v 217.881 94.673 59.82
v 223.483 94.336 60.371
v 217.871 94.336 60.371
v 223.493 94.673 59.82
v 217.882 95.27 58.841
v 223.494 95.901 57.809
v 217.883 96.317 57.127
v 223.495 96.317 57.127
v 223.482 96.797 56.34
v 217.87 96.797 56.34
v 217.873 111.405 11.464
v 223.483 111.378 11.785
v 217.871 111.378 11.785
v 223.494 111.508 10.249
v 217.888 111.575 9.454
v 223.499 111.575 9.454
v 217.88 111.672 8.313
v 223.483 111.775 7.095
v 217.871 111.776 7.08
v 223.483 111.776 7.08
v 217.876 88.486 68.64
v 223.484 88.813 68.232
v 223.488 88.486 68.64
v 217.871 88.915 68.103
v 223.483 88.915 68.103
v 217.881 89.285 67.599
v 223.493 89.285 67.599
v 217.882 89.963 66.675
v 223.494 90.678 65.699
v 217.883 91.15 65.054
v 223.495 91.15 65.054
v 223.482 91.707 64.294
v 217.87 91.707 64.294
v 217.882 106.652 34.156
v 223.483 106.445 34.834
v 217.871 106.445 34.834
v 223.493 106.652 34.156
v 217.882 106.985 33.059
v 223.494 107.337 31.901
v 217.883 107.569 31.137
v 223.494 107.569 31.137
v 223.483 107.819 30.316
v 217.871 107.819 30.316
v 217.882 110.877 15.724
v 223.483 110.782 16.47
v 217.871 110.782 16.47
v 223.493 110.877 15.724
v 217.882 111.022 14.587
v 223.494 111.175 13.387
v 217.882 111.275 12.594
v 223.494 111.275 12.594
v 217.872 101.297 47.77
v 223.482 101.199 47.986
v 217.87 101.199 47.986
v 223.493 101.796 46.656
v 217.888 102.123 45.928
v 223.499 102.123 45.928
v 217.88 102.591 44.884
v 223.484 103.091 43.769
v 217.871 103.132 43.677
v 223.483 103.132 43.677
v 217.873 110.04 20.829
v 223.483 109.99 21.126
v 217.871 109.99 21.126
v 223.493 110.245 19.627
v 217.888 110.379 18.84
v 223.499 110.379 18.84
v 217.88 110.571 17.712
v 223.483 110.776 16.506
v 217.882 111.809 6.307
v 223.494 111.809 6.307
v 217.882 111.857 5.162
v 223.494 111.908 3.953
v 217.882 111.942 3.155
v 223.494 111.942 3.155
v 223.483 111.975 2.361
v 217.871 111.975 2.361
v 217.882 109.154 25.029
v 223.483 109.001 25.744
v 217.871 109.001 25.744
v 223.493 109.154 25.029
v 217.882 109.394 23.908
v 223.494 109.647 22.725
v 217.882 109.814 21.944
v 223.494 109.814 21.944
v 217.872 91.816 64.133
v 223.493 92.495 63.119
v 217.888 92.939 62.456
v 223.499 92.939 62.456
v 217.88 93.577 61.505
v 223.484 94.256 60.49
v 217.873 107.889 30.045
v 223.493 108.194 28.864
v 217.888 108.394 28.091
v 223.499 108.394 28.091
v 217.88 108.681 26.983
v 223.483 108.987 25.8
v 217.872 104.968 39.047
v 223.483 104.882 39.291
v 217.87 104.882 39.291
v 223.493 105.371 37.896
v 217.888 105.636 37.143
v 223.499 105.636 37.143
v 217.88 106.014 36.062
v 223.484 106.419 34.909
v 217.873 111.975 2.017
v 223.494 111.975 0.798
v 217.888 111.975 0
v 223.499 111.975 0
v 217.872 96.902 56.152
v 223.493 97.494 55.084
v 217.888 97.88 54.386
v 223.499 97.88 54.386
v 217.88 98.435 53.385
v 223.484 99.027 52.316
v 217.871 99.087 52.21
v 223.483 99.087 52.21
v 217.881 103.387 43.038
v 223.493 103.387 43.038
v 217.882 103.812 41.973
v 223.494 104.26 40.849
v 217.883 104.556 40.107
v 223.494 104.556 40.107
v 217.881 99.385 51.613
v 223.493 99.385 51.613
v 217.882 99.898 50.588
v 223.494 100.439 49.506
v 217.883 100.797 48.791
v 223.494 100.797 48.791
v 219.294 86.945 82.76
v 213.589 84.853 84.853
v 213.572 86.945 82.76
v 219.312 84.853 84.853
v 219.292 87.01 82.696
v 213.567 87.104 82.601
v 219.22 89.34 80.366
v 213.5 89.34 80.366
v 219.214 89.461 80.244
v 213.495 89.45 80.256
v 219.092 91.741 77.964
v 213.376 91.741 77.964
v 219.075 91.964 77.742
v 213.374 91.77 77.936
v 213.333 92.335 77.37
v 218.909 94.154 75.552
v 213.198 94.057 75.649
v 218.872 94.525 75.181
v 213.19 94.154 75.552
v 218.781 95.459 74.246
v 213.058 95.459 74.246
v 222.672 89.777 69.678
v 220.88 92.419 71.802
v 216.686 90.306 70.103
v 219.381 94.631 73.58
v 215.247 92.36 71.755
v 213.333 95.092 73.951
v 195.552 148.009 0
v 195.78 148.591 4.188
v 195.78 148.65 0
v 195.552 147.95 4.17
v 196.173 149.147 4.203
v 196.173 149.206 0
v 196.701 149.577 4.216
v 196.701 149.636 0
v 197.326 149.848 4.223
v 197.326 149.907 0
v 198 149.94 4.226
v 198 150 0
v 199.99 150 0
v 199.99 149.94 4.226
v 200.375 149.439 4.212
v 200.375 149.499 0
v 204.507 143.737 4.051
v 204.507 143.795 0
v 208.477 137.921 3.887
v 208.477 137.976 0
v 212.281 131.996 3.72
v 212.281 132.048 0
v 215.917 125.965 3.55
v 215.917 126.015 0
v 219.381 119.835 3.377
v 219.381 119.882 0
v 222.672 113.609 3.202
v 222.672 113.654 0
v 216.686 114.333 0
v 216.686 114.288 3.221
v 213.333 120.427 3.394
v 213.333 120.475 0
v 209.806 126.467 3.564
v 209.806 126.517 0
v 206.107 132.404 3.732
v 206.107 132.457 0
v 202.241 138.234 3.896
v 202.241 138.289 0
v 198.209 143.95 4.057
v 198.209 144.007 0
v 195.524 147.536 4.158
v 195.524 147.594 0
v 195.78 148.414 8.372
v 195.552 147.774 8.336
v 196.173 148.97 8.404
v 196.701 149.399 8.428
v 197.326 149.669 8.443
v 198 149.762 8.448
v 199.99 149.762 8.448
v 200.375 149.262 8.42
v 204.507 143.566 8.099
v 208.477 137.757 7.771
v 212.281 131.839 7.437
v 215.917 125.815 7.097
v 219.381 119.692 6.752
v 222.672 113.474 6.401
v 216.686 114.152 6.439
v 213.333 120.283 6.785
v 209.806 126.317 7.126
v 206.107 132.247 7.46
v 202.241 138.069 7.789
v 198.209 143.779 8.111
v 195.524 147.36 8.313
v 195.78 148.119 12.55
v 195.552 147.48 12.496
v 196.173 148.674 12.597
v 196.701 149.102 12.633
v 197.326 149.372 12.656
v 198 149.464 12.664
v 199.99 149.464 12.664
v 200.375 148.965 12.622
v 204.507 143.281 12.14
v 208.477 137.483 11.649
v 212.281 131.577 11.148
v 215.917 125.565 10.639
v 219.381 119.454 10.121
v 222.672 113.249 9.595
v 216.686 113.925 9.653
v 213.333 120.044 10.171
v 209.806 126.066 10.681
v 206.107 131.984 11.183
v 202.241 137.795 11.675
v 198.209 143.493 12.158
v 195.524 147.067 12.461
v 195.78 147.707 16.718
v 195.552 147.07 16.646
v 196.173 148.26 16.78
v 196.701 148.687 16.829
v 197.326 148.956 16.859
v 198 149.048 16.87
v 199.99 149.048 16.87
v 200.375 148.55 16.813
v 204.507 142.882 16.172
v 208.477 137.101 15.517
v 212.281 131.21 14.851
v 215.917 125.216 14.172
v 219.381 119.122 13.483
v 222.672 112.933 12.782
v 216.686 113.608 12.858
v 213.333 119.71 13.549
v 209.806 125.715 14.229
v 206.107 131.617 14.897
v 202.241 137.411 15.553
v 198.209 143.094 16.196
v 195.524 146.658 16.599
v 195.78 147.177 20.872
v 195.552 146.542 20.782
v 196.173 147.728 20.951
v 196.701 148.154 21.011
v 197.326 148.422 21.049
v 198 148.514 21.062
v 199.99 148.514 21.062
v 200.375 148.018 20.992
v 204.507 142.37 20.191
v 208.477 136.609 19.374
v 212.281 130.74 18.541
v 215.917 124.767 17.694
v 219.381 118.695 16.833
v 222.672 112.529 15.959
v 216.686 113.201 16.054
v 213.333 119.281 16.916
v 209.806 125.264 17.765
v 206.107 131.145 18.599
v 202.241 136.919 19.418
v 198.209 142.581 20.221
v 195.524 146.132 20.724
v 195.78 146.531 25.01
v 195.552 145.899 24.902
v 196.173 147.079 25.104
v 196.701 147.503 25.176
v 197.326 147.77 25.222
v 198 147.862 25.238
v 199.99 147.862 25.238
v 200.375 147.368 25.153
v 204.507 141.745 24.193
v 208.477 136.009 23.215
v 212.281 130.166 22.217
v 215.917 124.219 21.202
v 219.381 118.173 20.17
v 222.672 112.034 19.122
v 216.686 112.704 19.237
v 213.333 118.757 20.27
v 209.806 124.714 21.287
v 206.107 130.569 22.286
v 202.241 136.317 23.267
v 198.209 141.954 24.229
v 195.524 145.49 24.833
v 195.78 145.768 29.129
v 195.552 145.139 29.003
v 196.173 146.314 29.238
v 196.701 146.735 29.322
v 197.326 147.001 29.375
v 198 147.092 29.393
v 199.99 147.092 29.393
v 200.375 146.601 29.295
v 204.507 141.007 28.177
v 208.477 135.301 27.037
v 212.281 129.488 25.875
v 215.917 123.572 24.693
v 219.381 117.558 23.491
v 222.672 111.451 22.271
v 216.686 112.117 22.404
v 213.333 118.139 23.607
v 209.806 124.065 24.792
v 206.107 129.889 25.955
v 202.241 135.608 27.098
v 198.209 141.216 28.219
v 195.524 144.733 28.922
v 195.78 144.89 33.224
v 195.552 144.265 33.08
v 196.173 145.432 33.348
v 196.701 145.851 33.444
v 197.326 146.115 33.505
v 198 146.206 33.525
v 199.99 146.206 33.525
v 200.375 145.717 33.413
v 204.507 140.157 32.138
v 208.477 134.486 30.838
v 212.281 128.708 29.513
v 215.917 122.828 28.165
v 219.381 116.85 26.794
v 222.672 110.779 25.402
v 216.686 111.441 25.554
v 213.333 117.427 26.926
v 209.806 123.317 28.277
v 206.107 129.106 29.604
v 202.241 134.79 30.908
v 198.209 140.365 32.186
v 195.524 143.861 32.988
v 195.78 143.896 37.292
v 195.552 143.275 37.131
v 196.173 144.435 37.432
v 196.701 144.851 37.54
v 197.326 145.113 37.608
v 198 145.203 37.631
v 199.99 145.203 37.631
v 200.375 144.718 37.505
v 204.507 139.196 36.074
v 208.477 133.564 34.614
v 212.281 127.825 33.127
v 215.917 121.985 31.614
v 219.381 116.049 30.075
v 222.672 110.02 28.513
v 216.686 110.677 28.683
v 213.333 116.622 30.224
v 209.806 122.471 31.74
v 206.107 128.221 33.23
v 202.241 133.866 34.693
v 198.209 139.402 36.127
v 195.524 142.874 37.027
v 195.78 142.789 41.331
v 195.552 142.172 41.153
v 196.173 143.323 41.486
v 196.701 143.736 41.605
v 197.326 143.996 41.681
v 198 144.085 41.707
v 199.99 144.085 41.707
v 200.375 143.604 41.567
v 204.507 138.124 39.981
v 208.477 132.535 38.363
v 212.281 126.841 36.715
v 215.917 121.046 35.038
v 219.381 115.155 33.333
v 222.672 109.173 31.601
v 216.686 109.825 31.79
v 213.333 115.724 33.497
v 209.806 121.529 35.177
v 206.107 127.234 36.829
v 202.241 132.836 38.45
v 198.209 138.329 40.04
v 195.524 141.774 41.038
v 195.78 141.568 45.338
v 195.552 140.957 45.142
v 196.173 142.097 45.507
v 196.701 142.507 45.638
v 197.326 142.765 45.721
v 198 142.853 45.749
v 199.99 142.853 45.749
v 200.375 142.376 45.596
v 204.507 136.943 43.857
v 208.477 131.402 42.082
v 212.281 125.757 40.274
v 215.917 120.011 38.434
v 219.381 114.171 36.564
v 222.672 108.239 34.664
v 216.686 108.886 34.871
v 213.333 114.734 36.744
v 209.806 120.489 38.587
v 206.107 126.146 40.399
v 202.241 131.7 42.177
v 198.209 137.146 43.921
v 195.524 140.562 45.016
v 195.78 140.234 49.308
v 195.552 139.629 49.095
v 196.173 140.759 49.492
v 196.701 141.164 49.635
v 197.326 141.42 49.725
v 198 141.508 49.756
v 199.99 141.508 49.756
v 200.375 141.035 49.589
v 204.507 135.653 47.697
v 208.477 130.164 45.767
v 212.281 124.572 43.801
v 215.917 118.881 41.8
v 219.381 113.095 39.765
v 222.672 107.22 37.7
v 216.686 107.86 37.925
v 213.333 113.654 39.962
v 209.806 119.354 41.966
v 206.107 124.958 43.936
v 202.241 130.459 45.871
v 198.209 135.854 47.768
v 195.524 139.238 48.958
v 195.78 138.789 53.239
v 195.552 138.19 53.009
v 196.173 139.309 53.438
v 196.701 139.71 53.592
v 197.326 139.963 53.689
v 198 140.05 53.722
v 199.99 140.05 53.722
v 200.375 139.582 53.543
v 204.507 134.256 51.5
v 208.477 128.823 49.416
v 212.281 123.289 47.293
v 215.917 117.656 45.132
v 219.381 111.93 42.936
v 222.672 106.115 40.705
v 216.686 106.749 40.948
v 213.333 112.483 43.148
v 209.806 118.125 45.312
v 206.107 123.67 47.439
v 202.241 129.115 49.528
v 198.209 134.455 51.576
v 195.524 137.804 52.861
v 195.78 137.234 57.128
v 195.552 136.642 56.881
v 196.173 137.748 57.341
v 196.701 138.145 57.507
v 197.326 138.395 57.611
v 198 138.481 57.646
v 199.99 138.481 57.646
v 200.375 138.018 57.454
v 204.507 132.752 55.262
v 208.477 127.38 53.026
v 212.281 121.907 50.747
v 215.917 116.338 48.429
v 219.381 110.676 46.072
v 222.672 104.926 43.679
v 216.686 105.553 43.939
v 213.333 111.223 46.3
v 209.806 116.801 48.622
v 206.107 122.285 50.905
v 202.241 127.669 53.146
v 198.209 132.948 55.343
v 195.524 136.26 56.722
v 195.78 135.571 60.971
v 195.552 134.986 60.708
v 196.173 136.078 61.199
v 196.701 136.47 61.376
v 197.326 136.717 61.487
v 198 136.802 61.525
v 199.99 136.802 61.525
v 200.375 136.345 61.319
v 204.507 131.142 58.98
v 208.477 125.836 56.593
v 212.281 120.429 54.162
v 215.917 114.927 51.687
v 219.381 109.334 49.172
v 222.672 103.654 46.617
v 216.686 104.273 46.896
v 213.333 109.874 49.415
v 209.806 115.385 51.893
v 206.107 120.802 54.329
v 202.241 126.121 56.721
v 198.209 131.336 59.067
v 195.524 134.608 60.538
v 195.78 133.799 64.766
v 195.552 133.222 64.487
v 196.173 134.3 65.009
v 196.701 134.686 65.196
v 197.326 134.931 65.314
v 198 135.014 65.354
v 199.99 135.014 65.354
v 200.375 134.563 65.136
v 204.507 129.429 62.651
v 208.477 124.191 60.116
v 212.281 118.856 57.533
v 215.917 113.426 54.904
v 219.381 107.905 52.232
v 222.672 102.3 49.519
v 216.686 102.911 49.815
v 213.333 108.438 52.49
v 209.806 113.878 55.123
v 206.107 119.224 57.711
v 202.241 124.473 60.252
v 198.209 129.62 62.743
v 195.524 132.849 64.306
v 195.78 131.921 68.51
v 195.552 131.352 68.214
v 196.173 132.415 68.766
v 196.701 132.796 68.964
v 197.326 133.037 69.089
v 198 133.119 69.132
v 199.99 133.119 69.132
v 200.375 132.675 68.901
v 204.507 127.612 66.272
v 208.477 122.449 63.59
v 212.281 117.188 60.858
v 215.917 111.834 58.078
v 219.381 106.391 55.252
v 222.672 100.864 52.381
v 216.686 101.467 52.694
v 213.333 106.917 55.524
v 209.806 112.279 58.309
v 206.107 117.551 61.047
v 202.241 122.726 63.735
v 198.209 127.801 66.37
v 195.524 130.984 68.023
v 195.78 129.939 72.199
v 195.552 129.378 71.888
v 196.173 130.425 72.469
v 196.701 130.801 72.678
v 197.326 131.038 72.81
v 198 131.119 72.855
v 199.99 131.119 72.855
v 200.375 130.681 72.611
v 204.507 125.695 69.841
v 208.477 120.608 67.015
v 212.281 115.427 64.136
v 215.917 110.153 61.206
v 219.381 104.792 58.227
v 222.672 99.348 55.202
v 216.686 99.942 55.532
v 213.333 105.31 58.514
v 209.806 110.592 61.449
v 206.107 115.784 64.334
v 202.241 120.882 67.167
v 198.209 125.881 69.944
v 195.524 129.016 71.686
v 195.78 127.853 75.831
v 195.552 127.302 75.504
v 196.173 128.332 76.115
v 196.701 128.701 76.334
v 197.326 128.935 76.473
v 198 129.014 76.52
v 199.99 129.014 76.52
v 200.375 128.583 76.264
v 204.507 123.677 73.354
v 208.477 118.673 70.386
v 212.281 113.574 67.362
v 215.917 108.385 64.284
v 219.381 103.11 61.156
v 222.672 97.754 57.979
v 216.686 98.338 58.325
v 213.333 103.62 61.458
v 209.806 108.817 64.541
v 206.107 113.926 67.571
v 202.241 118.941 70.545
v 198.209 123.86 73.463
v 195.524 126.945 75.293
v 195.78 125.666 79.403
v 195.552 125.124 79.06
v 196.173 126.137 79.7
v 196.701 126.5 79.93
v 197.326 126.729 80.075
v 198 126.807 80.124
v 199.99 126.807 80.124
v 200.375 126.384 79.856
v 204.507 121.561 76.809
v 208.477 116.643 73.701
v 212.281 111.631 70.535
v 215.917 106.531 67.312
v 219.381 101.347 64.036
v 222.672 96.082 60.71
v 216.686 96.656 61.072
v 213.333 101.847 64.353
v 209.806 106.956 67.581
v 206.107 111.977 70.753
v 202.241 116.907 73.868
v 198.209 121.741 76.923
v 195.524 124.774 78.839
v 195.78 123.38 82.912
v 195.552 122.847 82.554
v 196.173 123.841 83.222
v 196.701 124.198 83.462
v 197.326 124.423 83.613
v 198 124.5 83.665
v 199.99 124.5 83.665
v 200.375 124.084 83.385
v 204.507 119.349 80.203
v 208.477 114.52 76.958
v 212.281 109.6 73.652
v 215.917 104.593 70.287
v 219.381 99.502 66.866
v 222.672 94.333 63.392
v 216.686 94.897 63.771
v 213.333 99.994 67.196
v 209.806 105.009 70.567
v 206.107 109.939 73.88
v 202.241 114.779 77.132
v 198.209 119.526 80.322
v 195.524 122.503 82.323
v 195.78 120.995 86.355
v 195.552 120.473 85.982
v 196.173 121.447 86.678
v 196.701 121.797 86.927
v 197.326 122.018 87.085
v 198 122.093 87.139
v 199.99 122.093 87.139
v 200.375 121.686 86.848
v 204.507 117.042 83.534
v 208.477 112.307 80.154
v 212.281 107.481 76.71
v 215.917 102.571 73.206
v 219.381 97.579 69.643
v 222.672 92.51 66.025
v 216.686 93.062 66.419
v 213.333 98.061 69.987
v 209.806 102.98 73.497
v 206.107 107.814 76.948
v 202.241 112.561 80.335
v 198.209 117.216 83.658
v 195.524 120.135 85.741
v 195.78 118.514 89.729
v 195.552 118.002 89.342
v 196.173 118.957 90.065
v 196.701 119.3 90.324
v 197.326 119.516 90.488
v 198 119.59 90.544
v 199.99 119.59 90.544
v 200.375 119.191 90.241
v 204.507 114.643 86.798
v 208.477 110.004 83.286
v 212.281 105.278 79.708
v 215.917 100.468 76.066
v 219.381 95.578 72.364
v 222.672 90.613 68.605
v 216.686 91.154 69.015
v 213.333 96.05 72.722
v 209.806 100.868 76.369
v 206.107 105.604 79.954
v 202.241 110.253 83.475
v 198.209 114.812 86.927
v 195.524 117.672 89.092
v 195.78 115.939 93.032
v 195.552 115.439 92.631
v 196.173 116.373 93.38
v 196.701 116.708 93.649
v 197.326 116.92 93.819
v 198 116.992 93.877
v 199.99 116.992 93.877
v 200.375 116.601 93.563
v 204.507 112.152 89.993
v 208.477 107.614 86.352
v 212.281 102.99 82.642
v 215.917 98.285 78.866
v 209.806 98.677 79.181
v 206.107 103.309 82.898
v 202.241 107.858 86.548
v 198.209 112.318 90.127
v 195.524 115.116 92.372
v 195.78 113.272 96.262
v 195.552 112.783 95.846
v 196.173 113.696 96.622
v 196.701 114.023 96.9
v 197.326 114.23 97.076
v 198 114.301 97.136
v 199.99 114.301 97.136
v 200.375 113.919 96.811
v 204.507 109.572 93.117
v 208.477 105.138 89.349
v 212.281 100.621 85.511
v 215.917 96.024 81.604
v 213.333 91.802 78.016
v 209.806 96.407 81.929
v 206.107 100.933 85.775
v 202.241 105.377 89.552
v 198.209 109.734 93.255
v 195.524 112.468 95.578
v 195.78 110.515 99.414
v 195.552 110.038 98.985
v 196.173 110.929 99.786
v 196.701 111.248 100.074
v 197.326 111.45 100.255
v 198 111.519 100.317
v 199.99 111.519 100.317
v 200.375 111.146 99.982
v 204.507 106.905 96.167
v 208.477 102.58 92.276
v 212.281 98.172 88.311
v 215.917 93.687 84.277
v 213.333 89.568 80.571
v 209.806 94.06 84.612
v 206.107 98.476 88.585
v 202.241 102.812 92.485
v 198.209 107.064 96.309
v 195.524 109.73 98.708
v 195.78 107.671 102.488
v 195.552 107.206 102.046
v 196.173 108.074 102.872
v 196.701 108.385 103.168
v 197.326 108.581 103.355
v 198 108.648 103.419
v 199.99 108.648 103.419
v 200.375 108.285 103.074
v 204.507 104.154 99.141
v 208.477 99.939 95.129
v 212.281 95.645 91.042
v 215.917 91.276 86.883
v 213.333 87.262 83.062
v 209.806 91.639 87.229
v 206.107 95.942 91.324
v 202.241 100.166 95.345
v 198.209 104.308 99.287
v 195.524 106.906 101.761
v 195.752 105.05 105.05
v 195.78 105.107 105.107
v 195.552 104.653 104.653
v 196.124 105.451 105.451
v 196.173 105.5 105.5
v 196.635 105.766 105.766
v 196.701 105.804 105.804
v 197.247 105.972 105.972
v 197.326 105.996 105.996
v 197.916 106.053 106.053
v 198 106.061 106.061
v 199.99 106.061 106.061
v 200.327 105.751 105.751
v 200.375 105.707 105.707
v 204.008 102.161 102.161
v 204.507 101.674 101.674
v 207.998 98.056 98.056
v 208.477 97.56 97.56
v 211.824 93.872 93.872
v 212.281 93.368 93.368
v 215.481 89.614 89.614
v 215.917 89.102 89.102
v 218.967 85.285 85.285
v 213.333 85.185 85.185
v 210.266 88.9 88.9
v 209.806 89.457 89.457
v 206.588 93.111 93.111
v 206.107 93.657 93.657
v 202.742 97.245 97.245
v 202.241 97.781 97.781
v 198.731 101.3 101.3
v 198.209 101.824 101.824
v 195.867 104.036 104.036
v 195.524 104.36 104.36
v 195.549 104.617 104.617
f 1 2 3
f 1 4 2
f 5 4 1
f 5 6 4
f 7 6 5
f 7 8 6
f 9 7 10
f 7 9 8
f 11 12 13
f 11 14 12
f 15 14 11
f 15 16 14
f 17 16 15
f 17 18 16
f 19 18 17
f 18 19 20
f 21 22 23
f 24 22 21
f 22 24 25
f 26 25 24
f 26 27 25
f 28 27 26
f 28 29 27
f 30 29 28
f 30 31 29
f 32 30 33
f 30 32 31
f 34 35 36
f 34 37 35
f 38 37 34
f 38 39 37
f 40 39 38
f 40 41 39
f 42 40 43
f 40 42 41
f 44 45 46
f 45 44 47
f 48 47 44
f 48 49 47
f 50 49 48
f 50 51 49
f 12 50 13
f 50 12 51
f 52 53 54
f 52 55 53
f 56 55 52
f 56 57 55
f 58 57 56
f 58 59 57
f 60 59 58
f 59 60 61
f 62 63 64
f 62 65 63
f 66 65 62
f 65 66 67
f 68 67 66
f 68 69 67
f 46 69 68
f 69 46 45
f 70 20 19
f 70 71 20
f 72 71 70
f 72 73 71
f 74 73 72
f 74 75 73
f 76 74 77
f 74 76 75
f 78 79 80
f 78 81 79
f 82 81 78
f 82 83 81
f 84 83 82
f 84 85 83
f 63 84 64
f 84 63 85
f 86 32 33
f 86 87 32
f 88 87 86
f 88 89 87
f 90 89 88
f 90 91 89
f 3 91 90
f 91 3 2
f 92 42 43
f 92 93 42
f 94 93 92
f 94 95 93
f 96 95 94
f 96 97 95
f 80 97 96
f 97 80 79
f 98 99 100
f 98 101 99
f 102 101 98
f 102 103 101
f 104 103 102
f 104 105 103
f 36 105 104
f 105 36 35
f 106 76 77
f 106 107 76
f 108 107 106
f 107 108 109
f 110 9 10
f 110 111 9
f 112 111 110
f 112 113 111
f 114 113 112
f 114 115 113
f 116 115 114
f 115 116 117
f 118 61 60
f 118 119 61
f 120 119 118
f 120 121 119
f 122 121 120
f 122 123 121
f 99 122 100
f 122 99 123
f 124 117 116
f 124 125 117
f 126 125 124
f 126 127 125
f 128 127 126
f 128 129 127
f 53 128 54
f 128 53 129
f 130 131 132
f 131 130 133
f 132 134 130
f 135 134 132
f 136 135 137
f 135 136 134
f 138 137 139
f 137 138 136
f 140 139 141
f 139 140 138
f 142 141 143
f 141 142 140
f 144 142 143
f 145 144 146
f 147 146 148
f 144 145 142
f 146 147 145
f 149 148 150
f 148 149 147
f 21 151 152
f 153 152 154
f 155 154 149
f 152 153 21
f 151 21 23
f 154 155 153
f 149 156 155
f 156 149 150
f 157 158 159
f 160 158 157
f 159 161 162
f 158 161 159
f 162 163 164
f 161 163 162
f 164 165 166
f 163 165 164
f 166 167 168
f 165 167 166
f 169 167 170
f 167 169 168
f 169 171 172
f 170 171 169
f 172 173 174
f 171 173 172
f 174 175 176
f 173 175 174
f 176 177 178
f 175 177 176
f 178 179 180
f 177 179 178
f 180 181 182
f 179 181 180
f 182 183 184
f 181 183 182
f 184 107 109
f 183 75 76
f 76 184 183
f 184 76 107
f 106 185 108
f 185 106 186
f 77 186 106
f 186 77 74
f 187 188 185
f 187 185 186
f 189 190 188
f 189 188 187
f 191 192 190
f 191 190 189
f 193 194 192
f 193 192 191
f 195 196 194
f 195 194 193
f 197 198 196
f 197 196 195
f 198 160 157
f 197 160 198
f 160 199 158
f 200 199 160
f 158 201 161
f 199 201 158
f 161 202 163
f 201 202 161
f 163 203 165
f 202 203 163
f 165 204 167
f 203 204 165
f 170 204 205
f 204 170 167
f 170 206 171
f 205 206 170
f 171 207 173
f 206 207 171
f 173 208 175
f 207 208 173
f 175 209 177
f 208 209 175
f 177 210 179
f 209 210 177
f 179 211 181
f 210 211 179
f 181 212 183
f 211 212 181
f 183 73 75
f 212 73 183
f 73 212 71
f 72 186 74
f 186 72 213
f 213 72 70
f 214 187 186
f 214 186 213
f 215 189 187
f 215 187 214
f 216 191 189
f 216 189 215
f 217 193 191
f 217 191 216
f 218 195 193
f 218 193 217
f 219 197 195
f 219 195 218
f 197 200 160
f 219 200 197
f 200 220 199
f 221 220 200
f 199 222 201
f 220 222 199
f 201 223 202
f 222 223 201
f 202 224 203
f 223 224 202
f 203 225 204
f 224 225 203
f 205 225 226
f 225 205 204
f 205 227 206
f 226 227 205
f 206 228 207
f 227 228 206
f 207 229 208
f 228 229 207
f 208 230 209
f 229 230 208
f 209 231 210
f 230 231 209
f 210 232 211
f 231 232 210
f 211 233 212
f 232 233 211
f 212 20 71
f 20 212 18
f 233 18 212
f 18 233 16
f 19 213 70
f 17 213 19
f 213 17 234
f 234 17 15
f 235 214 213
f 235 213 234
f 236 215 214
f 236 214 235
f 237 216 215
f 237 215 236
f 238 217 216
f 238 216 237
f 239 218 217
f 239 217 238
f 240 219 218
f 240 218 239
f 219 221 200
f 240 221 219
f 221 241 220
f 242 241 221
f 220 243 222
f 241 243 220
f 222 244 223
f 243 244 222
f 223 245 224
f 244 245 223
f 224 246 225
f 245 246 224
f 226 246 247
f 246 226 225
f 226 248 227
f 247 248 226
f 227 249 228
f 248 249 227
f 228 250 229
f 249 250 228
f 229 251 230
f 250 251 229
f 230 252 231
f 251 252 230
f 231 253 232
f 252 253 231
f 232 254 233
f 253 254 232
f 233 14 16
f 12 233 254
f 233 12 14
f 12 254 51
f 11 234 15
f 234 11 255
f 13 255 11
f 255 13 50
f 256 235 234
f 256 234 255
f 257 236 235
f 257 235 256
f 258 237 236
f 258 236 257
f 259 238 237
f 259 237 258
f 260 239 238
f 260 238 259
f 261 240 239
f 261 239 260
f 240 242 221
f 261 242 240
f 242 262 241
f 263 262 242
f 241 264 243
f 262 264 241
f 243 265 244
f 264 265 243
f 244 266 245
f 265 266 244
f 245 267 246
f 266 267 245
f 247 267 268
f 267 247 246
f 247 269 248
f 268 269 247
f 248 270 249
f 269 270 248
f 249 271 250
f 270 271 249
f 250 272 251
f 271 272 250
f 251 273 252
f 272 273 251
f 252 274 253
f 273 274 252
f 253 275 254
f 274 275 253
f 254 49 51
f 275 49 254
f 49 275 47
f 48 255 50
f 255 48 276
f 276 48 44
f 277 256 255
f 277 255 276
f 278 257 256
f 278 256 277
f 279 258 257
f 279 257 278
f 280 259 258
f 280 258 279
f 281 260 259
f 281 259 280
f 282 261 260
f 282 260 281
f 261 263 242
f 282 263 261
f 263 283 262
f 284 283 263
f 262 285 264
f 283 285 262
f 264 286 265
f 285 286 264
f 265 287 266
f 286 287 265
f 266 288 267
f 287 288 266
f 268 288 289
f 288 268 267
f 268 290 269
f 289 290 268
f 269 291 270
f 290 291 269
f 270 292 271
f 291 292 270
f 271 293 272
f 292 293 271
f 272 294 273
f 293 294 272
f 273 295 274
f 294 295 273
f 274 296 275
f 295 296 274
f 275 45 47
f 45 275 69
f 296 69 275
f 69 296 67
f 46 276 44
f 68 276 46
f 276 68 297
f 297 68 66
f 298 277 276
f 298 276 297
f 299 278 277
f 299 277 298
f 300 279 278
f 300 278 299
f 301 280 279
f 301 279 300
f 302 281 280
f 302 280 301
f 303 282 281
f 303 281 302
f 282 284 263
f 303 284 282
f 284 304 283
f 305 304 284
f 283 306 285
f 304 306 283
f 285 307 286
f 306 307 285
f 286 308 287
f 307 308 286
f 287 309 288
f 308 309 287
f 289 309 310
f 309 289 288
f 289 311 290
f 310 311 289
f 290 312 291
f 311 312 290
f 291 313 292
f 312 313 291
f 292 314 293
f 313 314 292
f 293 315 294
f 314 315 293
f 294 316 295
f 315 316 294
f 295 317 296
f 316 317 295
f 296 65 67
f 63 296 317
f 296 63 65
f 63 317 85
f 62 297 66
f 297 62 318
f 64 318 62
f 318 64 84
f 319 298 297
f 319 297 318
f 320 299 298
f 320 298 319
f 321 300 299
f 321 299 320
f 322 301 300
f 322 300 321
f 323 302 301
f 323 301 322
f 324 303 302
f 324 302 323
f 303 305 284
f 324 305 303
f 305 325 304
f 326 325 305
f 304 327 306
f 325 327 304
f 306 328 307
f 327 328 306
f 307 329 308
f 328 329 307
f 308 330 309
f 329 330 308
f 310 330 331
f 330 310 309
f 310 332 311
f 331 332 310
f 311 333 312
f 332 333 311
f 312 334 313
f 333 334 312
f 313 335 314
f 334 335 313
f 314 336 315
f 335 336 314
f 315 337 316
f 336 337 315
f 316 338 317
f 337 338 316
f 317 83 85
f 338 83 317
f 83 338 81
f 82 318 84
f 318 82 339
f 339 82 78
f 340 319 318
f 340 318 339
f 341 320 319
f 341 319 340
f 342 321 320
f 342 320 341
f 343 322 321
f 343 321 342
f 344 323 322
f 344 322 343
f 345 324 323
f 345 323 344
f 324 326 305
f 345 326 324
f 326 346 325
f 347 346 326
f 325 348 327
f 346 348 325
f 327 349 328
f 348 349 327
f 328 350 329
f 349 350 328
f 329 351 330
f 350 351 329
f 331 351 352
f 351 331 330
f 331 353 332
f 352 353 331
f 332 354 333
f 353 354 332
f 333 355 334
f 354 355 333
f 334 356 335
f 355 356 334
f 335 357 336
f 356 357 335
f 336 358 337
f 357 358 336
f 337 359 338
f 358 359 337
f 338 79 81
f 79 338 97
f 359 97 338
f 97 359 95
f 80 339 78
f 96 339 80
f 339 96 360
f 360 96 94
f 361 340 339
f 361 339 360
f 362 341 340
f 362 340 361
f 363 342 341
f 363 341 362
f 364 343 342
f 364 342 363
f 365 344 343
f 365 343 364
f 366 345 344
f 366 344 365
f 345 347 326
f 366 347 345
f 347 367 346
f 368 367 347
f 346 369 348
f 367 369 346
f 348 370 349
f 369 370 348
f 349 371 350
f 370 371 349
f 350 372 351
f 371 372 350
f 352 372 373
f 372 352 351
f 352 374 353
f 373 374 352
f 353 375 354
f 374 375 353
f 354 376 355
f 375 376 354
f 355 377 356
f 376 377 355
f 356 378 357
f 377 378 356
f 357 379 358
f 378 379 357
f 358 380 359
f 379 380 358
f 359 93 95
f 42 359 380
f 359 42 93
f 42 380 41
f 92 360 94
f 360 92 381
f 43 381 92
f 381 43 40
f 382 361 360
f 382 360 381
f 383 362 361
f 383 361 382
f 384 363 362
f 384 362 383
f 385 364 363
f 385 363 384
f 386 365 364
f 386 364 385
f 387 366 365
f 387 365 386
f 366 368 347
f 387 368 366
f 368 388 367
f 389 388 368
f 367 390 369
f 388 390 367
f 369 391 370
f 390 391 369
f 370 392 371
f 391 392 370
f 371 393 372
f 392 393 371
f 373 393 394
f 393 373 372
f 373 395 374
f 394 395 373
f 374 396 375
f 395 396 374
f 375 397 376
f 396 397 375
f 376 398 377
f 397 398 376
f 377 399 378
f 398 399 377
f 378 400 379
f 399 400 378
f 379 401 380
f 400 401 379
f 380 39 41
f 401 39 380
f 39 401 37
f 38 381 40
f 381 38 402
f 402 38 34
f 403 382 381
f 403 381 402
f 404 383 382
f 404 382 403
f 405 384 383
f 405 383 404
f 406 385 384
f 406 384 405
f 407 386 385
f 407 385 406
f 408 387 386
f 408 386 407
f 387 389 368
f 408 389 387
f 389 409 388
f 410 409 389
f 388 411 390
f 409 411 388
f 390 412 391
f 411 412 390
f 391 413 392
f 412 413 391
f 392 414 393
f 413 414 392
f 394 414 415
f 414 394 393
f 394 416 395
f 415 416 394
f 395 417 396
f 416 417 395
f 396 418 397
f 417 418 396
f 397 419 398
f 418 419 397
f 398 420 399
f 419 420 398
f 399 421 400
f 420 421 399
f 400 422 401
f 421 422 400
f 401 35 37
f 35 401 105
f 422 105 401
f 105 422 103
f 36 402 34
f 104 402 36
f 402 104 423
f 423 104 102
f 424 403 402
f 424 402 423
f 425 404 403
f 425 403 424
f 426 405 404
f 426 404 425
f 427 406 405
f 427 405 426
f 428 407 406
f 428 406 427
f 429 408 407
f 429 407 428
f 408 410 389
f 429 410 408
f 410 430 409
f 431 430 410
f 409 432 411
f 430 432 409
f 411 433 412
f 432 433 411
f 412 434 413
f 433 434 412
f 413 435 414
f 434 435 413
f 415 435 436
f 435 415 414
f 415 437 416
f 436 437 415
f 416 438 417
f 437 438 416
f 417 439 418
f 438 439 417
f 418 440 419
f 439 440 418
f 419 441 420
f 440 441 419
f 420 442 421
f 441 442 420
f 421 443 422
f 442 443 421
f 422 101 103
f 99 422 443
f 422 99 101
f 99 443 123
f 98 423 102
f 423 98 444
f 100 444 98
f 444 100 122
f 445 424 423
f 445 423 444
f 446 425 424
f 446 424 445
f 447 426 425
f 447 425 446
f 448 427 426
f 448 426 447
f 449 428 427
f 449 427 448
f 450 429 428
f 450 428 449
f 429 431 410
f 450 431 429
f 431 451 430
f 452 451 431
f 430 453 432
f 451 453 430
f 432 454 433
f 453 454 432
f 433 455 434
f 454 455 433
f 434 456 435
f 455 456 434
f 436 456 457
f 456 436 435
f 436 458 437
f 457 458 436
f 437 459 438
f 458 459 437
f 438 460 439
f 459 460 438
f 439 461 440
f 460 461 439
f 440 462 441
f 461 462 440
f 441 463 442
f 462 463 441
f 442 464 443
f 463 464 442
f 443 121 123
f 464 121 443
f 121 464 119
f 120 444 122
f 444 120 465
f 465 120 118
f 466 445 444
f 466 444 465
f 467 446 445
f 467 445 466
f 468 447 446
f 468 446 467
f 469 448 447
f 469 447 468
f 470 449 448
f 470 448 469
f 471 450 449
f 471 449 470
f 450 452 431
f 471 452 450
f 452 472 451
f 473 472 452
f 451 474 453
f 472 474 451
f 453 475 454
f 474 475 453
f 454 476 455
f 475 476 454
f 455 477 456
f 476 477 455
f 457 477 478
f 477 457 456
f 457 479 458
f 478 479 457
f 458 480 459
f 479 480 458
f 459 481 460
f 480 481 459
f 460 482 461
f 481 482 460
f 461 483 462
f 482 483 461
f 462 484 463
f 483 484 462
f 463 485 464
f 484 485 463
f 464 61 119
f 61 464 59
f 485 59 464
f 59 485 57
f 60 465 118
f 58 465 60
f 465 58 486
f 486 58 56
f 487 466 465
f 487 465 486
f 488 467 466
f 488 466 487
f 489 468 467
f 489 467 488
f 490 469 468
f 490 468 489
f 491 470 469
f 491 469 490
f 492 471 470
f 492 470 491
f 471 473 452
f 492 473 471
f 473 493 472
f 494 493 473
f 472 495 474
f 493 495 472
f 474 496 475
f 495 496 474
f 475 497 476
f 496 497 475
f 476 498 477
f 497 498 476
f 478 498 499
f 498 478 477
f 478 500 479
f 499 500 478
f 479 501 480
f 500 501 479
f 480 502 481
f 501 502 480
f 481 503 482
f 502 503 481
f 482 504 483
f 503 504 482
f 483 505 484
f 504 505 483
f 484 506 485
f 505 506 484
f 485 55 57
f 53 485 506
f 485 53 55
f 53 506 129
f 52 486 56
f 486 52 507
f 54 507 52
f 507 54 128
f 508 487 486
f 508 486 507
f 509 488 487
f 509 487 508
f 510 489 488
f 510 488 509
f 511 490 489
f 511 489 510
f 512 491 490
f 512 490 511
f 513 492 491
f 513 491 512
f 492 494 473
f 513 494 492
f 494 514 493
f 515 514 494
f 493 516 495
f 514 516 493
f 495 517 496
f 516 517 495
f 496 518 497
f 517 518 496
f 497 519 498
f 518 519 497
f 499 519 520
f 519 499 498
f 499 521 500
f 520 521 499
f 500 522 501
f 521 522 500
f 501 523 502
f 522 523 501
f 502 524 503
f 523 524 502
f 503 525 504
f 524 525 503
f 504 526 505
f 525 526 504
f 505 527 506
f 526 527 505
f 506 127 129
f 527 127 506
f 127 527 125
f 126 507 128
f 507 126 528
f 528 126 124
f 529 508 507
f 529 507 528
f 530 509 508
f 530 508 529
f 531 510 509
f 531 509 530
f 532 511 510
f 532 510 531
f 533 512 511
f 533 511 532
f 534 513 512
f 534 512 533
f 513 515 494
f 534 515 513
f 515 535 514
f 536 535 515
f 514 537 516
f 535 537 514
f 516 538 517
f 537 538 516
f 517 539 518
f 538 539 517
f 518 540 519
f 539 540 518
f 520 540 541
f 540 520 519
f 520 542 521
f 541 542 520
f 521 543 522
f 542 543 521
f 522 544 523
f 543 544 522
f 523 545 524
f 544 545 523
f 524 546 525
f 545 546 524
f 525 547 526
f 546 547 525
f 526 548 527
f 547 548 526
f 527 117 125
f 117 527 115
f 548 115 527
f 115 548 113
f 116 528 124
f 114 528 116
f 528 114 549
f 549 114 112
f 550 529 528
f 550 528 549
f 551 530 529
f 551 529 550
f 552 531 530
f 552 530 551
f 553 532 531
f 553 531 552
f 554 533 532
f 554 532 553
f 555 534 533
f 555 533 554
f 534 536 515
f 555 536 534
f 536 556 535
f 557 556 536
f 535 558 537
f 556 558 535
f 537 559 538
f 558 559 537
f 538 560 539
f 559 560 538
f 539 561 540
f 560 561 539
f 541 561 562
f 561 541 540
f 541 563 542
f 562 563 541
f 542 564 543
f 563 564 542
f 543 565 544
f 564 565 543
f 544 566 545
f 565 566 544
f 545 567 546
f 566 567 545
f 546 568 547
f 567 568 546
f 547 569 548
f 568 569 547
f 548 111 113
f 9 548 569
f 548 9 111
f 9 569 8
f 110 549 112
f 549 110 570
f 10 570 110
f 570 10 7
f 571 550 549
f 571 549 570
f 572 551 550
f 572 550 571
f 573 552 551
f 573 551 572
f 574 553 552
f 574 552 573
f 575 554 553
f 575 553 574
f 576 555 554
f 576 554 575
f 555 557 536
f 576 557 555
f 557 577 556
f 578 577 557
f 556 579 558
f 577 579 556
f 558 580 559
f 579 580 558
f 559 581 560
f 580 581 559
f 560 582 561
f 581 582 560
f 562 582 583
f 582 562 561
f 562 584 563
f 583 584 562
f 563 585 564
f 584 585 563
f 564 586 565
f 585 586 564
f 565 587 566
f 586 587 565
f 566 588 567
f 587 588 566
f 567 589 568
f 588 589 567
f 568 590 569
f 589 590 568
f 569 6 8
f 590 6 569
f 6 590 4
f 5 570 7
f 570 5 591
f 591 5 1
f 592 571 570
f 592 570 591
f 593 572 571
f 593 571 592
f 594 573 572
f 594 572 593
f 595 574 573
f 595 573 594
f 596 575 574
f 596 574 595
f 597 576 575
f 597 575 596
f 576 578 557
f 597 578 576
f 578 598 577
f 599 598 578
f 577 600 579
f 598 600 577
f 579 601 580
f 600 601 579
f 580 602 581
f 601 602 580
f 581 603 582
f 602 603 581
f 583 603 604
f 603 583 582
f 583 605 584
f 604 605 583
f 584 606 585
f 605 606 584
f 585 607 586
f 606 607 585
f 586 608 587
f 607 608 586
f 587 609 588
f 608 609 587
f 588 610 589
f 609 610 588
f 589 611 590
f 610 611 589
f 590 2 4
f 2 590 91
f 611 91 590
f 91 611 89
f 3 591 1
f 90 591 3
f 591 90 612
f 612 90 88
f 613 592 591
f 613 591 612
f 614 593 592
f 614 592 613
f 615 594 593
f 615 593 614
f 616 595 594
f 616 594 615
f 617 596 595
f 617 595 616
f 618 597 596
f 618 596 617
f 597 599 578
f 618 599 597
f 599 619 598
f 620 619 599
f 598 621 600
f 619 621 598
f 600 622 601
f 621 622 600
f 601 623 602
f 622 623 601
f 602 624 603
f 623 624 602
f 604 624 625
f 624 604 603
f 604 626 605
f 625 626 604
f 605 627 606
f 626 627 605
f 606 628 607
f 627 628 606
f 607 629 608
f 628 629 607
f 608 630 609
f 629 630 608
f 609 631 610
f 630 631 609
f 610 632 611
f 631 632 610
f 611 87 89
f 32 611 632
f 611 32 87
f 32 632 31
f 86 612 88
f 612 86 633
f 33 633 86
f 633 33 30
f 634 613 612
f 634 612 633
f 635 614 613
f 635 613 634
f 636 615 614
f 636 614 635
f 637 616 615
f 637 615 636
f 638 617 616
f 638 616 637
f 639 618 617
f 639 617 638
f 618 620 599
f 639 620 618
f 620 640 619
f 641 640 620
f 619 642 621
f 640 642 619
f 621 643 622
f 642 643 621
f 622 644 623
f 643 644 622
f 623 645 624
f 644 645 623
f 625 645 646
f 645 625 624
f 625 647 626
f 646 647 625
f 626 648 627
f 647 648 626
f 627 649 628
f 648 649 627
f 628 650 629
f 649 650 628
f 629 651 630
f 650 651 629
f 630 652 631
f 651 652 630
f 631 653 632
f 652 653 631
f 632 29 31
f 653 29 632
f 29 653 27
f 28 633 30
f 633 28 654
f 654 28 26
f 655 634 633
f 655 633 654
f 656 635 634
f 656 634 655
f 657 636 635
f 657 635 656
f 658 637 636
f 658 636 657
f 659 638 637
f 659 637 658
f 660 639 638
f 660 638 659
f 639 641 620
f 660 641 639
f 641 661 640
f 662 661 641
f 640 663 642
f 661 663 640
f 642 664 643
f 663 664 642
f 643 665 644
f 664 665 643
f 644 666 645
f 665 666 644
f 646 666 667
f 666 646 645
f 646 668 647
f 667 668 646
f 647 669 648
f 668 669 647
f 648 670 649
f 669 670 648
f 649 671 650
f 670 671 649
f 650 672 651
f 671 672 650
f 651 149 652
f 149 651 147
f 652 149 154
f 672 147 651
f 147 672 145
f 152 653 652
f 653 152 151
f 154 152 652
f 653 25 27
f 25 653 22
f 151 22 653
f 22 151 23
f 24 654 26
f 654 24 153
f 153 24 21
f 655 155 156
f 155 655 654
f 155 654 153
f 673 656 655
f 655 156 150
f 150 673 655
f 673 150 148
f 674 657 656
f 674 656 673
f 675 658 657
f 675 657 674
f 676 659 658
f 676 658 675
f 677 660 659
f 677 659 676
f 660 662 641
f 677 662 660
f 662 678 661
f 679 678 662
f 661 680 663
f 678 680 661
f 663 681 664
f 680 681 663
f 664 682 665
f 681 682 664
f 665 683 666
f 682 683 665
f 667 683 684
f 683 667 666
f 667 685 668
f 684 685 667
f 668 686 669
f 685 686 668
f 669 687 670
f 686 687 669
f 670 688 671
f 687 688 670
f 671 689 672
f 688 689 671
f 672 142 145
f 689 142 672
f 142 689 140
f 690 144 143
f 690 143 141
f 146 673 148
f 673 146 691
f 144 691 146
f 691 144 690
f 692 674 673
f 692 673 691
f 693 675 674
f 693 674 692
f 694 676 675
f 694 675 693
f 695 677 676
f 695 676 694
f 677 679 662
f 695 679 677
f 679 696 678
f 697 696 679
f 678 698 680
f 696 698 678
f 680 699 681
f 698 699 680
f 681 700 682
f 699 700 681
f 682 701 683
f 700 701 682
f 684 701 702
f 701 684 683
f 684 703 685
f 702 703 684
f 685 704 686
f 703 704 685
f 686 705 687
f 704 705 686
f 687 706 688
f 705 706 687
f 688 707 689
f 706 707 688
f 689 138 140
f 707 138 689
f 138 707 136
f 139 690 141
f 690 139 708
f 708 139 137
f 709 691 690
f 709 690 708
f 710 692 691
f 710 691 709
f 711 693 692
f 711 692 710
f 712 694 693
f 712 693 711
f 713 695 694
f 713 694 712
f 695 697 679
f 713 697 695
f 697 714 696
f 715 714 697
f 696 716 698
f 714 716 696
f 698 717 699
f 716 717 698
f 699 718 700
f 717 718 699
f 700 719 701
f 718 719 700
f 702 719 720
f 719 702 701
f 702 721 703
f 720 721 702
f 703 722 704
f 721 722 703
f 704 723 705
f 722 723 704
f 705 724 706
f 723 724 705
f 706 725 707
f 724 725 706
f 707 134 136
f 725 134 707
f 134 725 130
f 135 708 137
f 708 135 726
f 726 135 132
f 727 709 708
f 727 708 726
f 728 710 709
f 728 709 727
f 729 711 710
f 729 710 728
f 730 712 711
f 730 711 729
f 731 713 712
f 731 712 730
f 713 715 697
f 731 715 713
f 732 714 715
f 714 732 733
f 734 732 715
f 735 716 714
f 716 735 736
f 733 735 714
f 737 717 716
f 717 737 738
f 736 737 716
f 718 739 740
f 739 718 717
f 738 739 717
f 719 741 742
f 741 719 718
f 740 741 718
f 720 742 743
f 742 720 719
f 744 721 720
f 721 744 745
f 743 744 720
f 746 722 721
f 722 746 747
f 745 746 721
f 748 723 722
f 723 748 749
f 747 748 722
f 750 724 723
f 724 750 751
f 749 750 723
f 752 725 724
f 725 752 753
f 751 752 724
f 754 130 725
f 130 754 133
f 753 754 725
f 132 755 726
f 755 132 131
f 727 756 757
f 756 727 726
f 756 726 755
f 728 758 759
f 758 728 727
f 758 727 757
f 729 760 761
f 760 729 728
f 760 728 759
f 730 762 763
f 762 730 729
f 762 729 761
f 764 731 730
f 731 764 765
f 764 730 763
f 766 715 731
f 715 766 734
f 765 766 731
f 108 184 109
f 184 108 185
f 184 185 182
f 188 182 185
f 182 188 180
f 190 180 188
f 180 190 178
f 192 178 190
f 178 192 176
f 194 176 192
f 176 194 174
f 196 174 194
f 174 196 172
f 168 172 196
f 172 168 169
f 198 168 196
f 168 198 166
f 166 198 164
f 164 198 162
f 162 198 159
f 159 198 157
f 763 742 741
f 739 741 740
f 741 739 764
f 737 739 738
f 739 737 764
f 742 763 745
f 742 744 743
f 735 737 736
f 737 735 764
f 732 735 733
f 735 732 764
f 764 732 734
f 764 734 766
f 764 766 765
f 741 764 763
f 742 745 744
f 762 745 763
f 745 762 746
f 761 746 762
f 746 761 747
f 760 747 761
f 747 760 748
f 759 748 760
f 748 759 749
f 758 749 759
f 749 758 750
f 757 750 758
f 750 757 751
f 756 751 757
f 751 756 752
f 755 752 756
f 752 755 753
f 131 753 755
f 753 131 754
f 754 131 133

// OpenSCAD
// file: ../motors/MN5212.scad
use <../utils.scad>

module MN5212(){

	//render(){
		difference(){
			union(){
				translate([0,0, 42.5 / 2 - 23 / 2 - 4.9 - 6])
					cylinder(
						h = 23,
						r = 59 / 2,
						$fa = fa(59 / 2),
						center = true);
				translate([0,0, 42.5 / 2 - 4.9 / 2 - 6])
					cylinder(
						h = 4.9,
						r1 = 59 / 2,
						r2 = 24.8 / 2,
						$fa = fa(59 / 2),
						center = true);
				translate([0,0, - 42.5 / 2 + 5.6 / 2 + 3])
					cylinder(
						h = 5.6,
						r1 = 44 / 2,
						r2 = 59 / 2,
						$fa = fa(59 / 2),
						center = true);
				translate([0, 0, 42.5 / 2 - 3])
					cylinder(
						h = 6,
						r = 4 / 2,
						$fa = fa(4 / 2),
						center = true);
				translate([0, 0, - 42.5 / 2 + 1.5])
					cylinder(
						h = 3,
						r = 6 / 2,
						$fa = fa(6 / 2),
						center = true);
			}
			union(){
				for(i = [0:90:270])
					rotate([0, 0, i])
						translate([0, 25 / 2, -16.25 - 0.025])
							cylinder(
								h = 4,
								r = 3 / 2,
								$fa = fa(3 / 2),
								center = true);
				for(i = [0:120:240])
					rotate([0, 0, i])
						translate([0, 17 / 2, 12.75 + 0.025])
							cylinder(
								h = 5,
								r = 3 / 2,
								$fa = fa(3 / 2),
								center = true);
				rotate([0, 0, 30])
					translate([0, 12 / 2, 12.75 + 0.025])
						cylinder(
							h = 5,
							r = 3 / 2,
							$fa = fa(3 / 2),
							center = true);
				rotate([0, 0, 30 + 180])
					translate([0, 12 / 2, 12.75 + 0.025])
						cylinder(
							h = 5,
							r = 3 / 2,
							$fa = fa(3 / 2),
							center = true);
			}
		}

	//}

}

MN5212();
// file: ../servos/TGY_4805_2PA.scad
use <../utils.scad>

module TGY_4805_2PA(){

	length = 40;
	width = 20;
	depth = 36.4;
	wing_width = 58;
	wing_thick = 2.45;
	wing_height = 27.7;
	shaft_offset = 9.5;
	hole_seperation = 9.2;
	hole_spacing = 50;
	shaft_height = 40;
	shaft_length = 3.6;
	hole_diameter = 4.8;

	module mounting_hole(){
		mh_rad = hole_diameter / 2;
		translate(
			[
				hole_spacing / 2,
				0,
				-depth / 2 + wing_height - wing_thick / 2
			])
			cylinder(h = 5, r = mh_rad, $fa = fa(mh_rad), center = true);
	}

	difference(){
		union(){
			cube([length, width, depth], center = true);
			translate([0, 0, -depth / 2 + wing_height - wing_thick / 2])
				cube([wing_width, width, wing_thick], center = true);
			translate(
				[
					- length / 2 + shaft_offset,
					0,
					shaft_height - length / 2 + shaft_length / 2
				])
				cylinder(
					h = shaft_length,
					r = 1.5,
					$fa = fa(1.5),
					center = true);
		}	union(){

			translate([0, hole_seperation / 2, 0]){
				mounting_hole();
				mirror() mounting_hole();
			}
			translate([0, -hole_seperation / 2, 0]){
				mounting_hole();
				mirror() mounting_hole();
			}
		}
	}
}

module TGY_4805_2PA_translate(){
	length = 40;
	shaft_offset = 9.5;
	shaft_height = 40;
	shaft_length = 3.6;
	translate(
		[
				- length / 2 + shaft_offset,
				0,
				shaft_height - length / 2 + shaft_length / 2
		]) children();
}

TGY_4805_2PA();
// file: ../servos/HS_5065MG.scad
use <../utils.scad>

module HS_5065MG(){

	length = 23.75;
	width = 11.68;
	depth = 20.32;
	wing_width = 32.38;
	wing_thick = 2;
	wing_offset = 1;
	shaft_offset = 6;
	hole_spacing = 28.32;
	hole_spacing_2 = 27;
	hole_2_wide = 6;
	hole_diameter = 2;
	shaft_height = 26.16;
	shaft_length = 2;

	module mounting_hole(){
		mh_rad = hole_diameter / 2;
		translate(
			[
				hole_spacing / 2,
				0,
				depth / 2 - wing_thick / 2
			])
			cylinder(h = 5, r = mh_rad, $fa = fa(mh_rad), center = true);
		translate(
			[
				hole_spacing_2 / 2,
				hole_2_wide / 2,
				depth / 2 - wing_thick / 2
			])
			cylinder(h = 5, r = mh_rad, $fa = fa(mh_rad), center = true);
		translate(
			[
				hole_spacing_2 / 2,
				- hole_2_wide / 2,
				depth / 2 - wing_thick / 2
			])
			cylinder(h = 5, r = mh_rad, $fa = fa(mh_rad), center = true);
	}

	difference(){
		union(){
			cube([length, width, depth], center = true);
			translate([0, 0, depth / 2 - wing_thick / 2 - wing_offset])
				cube([wing_width, width, wing_thick], center = true);
			translate(
				[
					- length / 2 + shaft_offset,
					0,
					depth / 2 + 3.8 + 1.9 + shaft_length / 2
				])
				cylinder(
					h = shaft_length,
					r = 1.5,
					$fa = fa(1.5),
					center = true);
			translate(
				[
					- length / 2 + shaft_offset,
					0,
					depth / 2 + 3.8 / 2
				])
				cylinder(
					h = 3.8,
					r = 11.3 / 2,
					$fa = fa(11.3 / 2),
					center = true);
			translate(
				[
					- length / 2 + shaft_offset,
					0,
					depth / 2 + 3.8 + 1.9 / 2
				])
				cylinder(
					h = 1.9,
					r1 = 11.3 / 2,
					r2 = 8 / 2,
					$fa = fa(11.3 / 2),
					center = true);
		}	union(){

			mounting_hole();
			mirror() mounting_hole();
		}
	}
}

module HS_5065MG_arm(){

	hole_size = 1.5;
	hole_spacing = 3;
	hole_offset = 9.6;

	difference(){
		union(){
			translate([0, 0, 4.4 / 2])
				cylinder(
					h = 4.4,
					r = 8 / 2,
					$fa = fa(8 / 2),
					center = true);
			hull(){
				translate([0, 0, 4.4 - 1.8 / 2])
					cylinder(
						h = 1.8,
						r = 8 / 2,
						$fa = fa(8 / 2),
						center = true);
				translate([18.8, 0, 4.4 - 1.8 / 2])
					cylinder(
						h = 1.8,
						r = 5 / 2,
						$fa = fa(5 / 2),
						center = true);
			}
		}
		union(){
			for(i = [0:3]){
				translate([hole_offset + hole_spacing * i, 0, 4.4 - 1.8 / 2])
					cylinder(
						h = 5,
						r = hole_size / 2,
						$fa = fa(hole_size / 2),
						center = true);
			}
		}
	}
}

module HS_5065MG_shaft_translate(){
	translate(
		[
			- 23.75 / 2 + 6,
			0,
			20.32 / 2 + 3.8 + 1.9
		])
			children();
}

HS_5065MG();
HS_5065MG_shaft_translate() HS_5065MG_arm();
// file: ../servos/LS_0006_servo.scad
// Author Michael Marques (DrYerzinia)

use <../utils.scad>

module ls_0006_servo(){
	
	length = 21.4;
	depth = 19.9;
	thickness = 11.65;

	gear_height = 2.6;
	gear_bump_height = 0.7;
	gear_bump_diameter = 1.97;
	gear_outer_bump_diameter = 6;
	gear_bump_offset = 12.2;

	shaft_height = 2.4;
	shaft_diameter = 3.74;
	shaft_offset = thickness / 2;
	shaft_screw_diameter = 1.3;
	
	wing_outer_width = 8.5;
	wing_top_off = 3.8;
	wing_length = 3.8;
	wing_thickness = 1.2;
	wing_hole_diameter = 1.85;
	wing_hole_edge_dist = 2;

	module wing_hole(){
		translate(
			[
				length / 2 + wing_hole_edge_dist,
				0,
				depth/2 - wing_top_off - wing_thickness / 2
			])
			cylinder(
				h = wing_thickness + 1,
				r = wing_hole_diameter / 2,
				$fn = 16,
				center = true);
	}

	module wing(){
		translate(
			[
				length / 2,
				thickness / 2,
				depth/2 - wing_top_off - wing_thickness
			])
			rotate([0,0,-90])
				trapezoid(
					thickness,
					wing_outer_width,
					wing_length,
					wing_thickness);
	}

	// Body
	cube([length, thickness, depth], center = true);

	difference(){
		union(){

			wing();
			mirror() wing();

			// Gear Bumps
			translate([0, 0, depth/2 + gear_height / 2]){
				translate([length / 2 - gear_bump_offset, 0, 0])
					cylinder(
						h = gear_height,
						r = gear_outer_bump_diameter / 2,
						$fn = 16,
						center = true);
				translate([length / 2 - gear_bump_offset, 0, gear_height/2 + gear_bump_height / 2])
					cylinder(
						h = gear_bump_height,
						r = gear_bump_diameter / 2,
						$fn = 16,
						center = true);
				translate([length / 2 - shaft_offset, 0, 0])
					cylinder(
						h = gear_height,
						r = thickness / 2,
						$fn = 32,
						center = true);
				// Shaft
				translate([length / 2 - shaft_offset, 0, gear_height])
					cylinder(
						h = shaft_height,
						r = shaft_diameter / 2,
						$fn = 16,
						center = true);
			}

		}
		union(){

			wing_hole();
			mirror() wing_hole();

			// Shaft_hole
			translate(
				[
					length / 2 - shaft_offset,
					0,
					depth/2 + gear_height * (3 / 2) + 0.5])
				cylinder(
					h = shaft_height + 1,
					r = shaft_screw_diameter / 2,
					$fn = 16,
					center = true);

		}
	}

}

module translate_ls_0006_attachment(){

	length = 21.4;
	thickness = 11.65;
	shaft_offset = thickness / 2;
	depth = 19.9;
	float = 3.3;

	translate([length / 2 - shaft_offset, 0, depth / 2 + float])
		children();

}

module bar_attachment(){

	height = 3.75;
	bar_length = 14.7;
	bar_thickness = 1.6;
	inner_radius = 5.9;
	outer_radius = 3.95;
	shaft_diameter = 3.7;
	upper_void_diameter = 4.8;
	screw_diameter = 2;
	hole_spacing = 2;
	hole_4_diameter = 1.2;
	hole_diameter = 1;
	hole_start_off = 4.7;
	top_void_depth = 0.67;
	bottom_void_depth = 1.84;

	translate([0, 0, height / 2]){
		difference(){
			union(){

				translate([0, inner_radius / 2, height / 2 - bar_thickness])
					rotate([0,0,-90])
						trapezoid(
							inner_radius,
							outer_radius,
							bar_length,
							bar_thickness);

				cylinder(
					h = height,
					r = inner_radius / 2,
					$fn = 16,
					center = true);

				translate([bar_length, 0, height / 2 - bar_thickness / 2])
					cylinder(
						h = bar_thickness,
						r = outer_radius / 2,
						$fn = 16,
						center = true);

			}
			union(){
				// screwhole
				cylinder(
					h = height + 1,
					r = screw_diameter / 2,
					$fn = 16,
					center = true);
				// voids
				translate([0, 0, height / 2 - top_void_depth / 2 + 0.5])
					cylinder(
						h = top_void_depth + 1,
						r = upper_void_diameter / 2,
						$fn = 16,
						center = true);
				translate([0, 0,  - bottom_void_depth / 2 - 0.5])
					cylinder(
						h = bottom_void_depth + 1,
						r = shaft_diameter / 2,
						$fn = 16,
						center = true);

				for(i = [0:4]){
					dia = (i != 3) ? hole_diameter : hole_4_diameter;
					translate(
						[
							hole_start_off + hole_spacing * i,
							0,
							height / 2 - bar_thickness / 2])
						cylinder(
							h = bar_thickness + 1,
							r = dia / 2,
							$fn = 16,
							center = true);
				}

			}
		}
	}

}

ls_0006_servo();
translate_ls_0006_attachment() bar_attachment();
// file: ../servos/parallax_continuous_rotation_servo.scad
// Author Michael Marques (DrYerzinia)

module parallax_continuous_rotation_servo(){

	depth = 37.7;
	length = 40.75;
	width = 19.75;

	mount_height = 2.7;
	mount_extent = 6.1;
	mount_from_top = 7.7;

	mount_hole_diameter = 4.46;
	mount_hole_spacing = 14.4 - mount_hole_diameter;

	shaft_diameter = 5.8;
	shaft_offset = 10;
	shaft_length = 3.5;

	module mounting_hole(){

			translate(
				[
					length / 2 + 5,
					mount_hole_spacing / 2,
					depth / 2 - mount_height / 2 - mount_from_top
				]
				)
				cylinder(
					h = mount_height + 1,
					r = mount_hole_diameter / 2,
					$fn=16,
					center = true);
	}

	difference(){
		union(){

			// Body
			cube([length,width,depth], center = true);

			// Mounting wings
			translate(
				[
					0,
					0,
					depth / 2 - mount_height / 2 - mount_from_top
				])
				cube(
					[
						length + mount_extent * 2,
						width,
						mount_height
					],
					center = true);

			// Shaft
			translate(
				[
					length / 2 - shaft_offset,
					0,
					depth / 2 + shaft_length / 2
				]
				)
				cylinder(
					h = shaft_length,
					r = shaft_diameter / 2,
					$fn = 16,
					center = true
				);

		}
		union(){

			// Mounting Holes
			mounting_hole();
			mirror()
				mounting_hole();

			translate([0,-mount_hole_spacing,0]){
				mounting_hole();
				mirror()
					mounting_hole();
			}
		}
	}

}

module translate_shaft(){

	depth = 37.7;
	length = 40.75;

	shaft_offset = 10;

	translate(
		[
			length / 2 - shaft_offset,
			0,
			depth / 2
		])
		children();
}

module round_servo_attachment(){

	height = 6;
	diameter = 20.8;
	inner_diameter = 8.6;
	plate_thickness = 2.45;

	float = 2;

	depth = 37.7;
	length = 40.75;

	shaft_offset = 10;

	plate_hole_spacing = 14.5;
	plate_hole_diameter = 1.4;
	plate_hole_minor_spacing = 3.5;

	screw_hole_diameter = 3;

	inner_diameter = 8;
	
	top_depth = 1.8;
	bottom_depth = 3.4;

	void_diameter = 5.8;

	module plate_hole(){
		cylinder(
			h = plate_thickness + 1,
			r = plate_hole_diameter / 2,
			$fn = 16,
			center = true
		);
	}

	module plate_hole_group(){
		translate([0, 0, height / 2 - plate_thickness / 2]){
			translate([0, plate_hole_spacing / 2, 0]){
					plate_hole();
					translate([- plate_hole_minor_spacing, 0, 0])
						plate_hole();
					translate([  plate_hole_minor_spacing, 0, 0])
						plate_hole();
			}
		}
	}

	translate(
		[
			length / 2 - shaft_offset,
			0,
			depth / 2 + height / 2 + float
		]
		)
		difference(){

			union(){

				// inner shaft
				cylinder(
					h = height,
					r = inner_diameter / 2,
					$fn = 16,
					center = true
				);

				// top
				translate([0, 0, height / 2 - plate_thickness / 2])
					cylinder(
						h = plate_thickness,
						r = diameter / 2,
						$fn = 32,
						center = true
					);
			}

			union(){

				// plate holes
				for(ang = [0:3]){
					rotate([0,0, ang * 90])
						plate_hole_group();
				}

				// screw hole
				cylinder(
					h = height + 1,
					r = screw_hole_diameter / 2,
					$fn = 16,
					center = true
				);

				// inner voids
				translate([0, 0, height / 2 - top_depth / 2 + 1])
					cylinder(
						h = top_depth + 1,
						r = void_diameter / 2,
						$fn = 16,
						center = true
					);
				translate([0, 0, -1])
					cylinder(
						h = bottom_depth + 1,
						r = void_diameter / 2,
						$fn = 16,
						center = true
					);

			}

		}

}

parallax_continuous_rotation_servo();
round_servo_attachment();
// file: ../hardware.scad
 // Author Michael Marques (DrYerzinia)

// http://www.ebay.com/itm/10-PCS-683-3x7x2-mm-Metal-OPEN-PRECISION-Miniature-Ball-Bearing-3-7-2-/291206307942?hash=item43cd3fa066:m:mCi6eovrGVk_CjIUjlhw8yg
// E-Bay empire.rc

module washer_M3_7x3_2x0_5mm(){

	difference(){
		cylinder(
			h = 0.5,
			r = 7 / 2,
			$fn = 16,
			center = true);
		cylinder(
			h = 0.5 + 0.1,
			r = 3.2 / 2,
			$fn = 16,
			center = true);
	}

}

module bearing_3x7x2mm(){

	difference(){
		cylinder(
			h = 2,
			r = 7 / 2,
			$fn = 16,
			center = true);
		cylinder(
			h = 2 + 1,
			r = 3 / 2,
			$fn = 16,
			center = true);
	}

}

module bearing_5x8x2_5mm(){

	difference(){
		cylinder(
			h = 2.5,
			r = 8 / 2,
			$fn = 16,
			center = true);
		cylinder(
			h = 2.5 + 1,
			r = 5 / 2,
			$fn = 16,
			center = true);
	}

}

module bearing_8x16x5mm(){

	difference(){
		cylinder(
			h = 5,
			r = 16 / 2,
			$fn = 16,
			center = true);
		cylinder(
			h = 5 + 1,
			r = 8 / 2,
			$fn = 16,
			center = true);
	}

}


bearing_5x8x2_5mm();
// file: ../utils.scad
// http://forum.openscad.org/Creating-pie-pizza-slice-shape-need-a-dynamic-length-array-td3148.html

module pie_slice(r, start_angle, end_angle) {
    R = r * sqrt(2) + 1;
    a0 = (4 * start_angle + 0 * end_angle) / 4;
    a1 = (3 * start_angle + 1 * end_angle) / 4;
    a2 = (2 * start_angle + 2 * end_angle) / 4;
    a3 = (1 * start_angle + 3 * end_angle) / 4;
    a4 = (0 * start_angle + 4 * end_angle) / 4;
    if(end_angle > start_angle)
        intersection() {
        circle(r, $fa = fa(r));
        polygon([
            [0,0],
            [R * cos(a0), R * sin(a0)],
            [R * cos(a1), R * sin(a1)],
            [R * cos(a2), R * sin(a2)],
            [R * cos(a3), R * sin(a3)],
            [R * cos(a4), R * sin(a4)],
            [0,0]
       ]);
    }
}

// https://github.com/openscad/openscad/issues/29

module rotate_about(v,a) {
	translate(v) rotate(a) translate(-v) children();
}

module rotate_about_axis(v, ang, axis) {
	translate(v) rotate(ang, axis) translate(-v) children();
}

// https://github.com/robofun/openscad-utils/blob/master/trapezoid.scad

module trapezoid(width_base, width_top, height, thickness){

  linear_extrude(height = thickness)
			polygon(
				points =
					[
						[0,0],
						[width_base,0],
						[width_base-(width_base-width_top)/2,height],
						[(width_base-width_top)/2,height]
					],
					paths=[[0,1,2,3]]); 
  
}

// http://forum.openscad.org/fe-Tolerance-based-arc-approximation-td14212.html

function fa(r)=($fn>0)?360/$fn:($fe>0)?($fe<r)?min(45,2*acos(1-$fe/r)):45:$fa; 
// file: ../render_settings.scad
// Author Michael Marques (DrYerzinia)

// Lulzbot Mini tolerances
// x/y 0.1mm
// z   0.05mm
//
// 0.1mm   preview tolerance
// 0.025mm export  tolerance

$fs = 0.01;
$fn = undef;
$fa = 360 / 5;

$fe = 0.025;	// export
// main file
// Author Michael Marques (DrYerzinia)

include <../render_settings.scad>

use <../BB8.scad>

rotate([-90, 0, 0])
	Door_P21();
